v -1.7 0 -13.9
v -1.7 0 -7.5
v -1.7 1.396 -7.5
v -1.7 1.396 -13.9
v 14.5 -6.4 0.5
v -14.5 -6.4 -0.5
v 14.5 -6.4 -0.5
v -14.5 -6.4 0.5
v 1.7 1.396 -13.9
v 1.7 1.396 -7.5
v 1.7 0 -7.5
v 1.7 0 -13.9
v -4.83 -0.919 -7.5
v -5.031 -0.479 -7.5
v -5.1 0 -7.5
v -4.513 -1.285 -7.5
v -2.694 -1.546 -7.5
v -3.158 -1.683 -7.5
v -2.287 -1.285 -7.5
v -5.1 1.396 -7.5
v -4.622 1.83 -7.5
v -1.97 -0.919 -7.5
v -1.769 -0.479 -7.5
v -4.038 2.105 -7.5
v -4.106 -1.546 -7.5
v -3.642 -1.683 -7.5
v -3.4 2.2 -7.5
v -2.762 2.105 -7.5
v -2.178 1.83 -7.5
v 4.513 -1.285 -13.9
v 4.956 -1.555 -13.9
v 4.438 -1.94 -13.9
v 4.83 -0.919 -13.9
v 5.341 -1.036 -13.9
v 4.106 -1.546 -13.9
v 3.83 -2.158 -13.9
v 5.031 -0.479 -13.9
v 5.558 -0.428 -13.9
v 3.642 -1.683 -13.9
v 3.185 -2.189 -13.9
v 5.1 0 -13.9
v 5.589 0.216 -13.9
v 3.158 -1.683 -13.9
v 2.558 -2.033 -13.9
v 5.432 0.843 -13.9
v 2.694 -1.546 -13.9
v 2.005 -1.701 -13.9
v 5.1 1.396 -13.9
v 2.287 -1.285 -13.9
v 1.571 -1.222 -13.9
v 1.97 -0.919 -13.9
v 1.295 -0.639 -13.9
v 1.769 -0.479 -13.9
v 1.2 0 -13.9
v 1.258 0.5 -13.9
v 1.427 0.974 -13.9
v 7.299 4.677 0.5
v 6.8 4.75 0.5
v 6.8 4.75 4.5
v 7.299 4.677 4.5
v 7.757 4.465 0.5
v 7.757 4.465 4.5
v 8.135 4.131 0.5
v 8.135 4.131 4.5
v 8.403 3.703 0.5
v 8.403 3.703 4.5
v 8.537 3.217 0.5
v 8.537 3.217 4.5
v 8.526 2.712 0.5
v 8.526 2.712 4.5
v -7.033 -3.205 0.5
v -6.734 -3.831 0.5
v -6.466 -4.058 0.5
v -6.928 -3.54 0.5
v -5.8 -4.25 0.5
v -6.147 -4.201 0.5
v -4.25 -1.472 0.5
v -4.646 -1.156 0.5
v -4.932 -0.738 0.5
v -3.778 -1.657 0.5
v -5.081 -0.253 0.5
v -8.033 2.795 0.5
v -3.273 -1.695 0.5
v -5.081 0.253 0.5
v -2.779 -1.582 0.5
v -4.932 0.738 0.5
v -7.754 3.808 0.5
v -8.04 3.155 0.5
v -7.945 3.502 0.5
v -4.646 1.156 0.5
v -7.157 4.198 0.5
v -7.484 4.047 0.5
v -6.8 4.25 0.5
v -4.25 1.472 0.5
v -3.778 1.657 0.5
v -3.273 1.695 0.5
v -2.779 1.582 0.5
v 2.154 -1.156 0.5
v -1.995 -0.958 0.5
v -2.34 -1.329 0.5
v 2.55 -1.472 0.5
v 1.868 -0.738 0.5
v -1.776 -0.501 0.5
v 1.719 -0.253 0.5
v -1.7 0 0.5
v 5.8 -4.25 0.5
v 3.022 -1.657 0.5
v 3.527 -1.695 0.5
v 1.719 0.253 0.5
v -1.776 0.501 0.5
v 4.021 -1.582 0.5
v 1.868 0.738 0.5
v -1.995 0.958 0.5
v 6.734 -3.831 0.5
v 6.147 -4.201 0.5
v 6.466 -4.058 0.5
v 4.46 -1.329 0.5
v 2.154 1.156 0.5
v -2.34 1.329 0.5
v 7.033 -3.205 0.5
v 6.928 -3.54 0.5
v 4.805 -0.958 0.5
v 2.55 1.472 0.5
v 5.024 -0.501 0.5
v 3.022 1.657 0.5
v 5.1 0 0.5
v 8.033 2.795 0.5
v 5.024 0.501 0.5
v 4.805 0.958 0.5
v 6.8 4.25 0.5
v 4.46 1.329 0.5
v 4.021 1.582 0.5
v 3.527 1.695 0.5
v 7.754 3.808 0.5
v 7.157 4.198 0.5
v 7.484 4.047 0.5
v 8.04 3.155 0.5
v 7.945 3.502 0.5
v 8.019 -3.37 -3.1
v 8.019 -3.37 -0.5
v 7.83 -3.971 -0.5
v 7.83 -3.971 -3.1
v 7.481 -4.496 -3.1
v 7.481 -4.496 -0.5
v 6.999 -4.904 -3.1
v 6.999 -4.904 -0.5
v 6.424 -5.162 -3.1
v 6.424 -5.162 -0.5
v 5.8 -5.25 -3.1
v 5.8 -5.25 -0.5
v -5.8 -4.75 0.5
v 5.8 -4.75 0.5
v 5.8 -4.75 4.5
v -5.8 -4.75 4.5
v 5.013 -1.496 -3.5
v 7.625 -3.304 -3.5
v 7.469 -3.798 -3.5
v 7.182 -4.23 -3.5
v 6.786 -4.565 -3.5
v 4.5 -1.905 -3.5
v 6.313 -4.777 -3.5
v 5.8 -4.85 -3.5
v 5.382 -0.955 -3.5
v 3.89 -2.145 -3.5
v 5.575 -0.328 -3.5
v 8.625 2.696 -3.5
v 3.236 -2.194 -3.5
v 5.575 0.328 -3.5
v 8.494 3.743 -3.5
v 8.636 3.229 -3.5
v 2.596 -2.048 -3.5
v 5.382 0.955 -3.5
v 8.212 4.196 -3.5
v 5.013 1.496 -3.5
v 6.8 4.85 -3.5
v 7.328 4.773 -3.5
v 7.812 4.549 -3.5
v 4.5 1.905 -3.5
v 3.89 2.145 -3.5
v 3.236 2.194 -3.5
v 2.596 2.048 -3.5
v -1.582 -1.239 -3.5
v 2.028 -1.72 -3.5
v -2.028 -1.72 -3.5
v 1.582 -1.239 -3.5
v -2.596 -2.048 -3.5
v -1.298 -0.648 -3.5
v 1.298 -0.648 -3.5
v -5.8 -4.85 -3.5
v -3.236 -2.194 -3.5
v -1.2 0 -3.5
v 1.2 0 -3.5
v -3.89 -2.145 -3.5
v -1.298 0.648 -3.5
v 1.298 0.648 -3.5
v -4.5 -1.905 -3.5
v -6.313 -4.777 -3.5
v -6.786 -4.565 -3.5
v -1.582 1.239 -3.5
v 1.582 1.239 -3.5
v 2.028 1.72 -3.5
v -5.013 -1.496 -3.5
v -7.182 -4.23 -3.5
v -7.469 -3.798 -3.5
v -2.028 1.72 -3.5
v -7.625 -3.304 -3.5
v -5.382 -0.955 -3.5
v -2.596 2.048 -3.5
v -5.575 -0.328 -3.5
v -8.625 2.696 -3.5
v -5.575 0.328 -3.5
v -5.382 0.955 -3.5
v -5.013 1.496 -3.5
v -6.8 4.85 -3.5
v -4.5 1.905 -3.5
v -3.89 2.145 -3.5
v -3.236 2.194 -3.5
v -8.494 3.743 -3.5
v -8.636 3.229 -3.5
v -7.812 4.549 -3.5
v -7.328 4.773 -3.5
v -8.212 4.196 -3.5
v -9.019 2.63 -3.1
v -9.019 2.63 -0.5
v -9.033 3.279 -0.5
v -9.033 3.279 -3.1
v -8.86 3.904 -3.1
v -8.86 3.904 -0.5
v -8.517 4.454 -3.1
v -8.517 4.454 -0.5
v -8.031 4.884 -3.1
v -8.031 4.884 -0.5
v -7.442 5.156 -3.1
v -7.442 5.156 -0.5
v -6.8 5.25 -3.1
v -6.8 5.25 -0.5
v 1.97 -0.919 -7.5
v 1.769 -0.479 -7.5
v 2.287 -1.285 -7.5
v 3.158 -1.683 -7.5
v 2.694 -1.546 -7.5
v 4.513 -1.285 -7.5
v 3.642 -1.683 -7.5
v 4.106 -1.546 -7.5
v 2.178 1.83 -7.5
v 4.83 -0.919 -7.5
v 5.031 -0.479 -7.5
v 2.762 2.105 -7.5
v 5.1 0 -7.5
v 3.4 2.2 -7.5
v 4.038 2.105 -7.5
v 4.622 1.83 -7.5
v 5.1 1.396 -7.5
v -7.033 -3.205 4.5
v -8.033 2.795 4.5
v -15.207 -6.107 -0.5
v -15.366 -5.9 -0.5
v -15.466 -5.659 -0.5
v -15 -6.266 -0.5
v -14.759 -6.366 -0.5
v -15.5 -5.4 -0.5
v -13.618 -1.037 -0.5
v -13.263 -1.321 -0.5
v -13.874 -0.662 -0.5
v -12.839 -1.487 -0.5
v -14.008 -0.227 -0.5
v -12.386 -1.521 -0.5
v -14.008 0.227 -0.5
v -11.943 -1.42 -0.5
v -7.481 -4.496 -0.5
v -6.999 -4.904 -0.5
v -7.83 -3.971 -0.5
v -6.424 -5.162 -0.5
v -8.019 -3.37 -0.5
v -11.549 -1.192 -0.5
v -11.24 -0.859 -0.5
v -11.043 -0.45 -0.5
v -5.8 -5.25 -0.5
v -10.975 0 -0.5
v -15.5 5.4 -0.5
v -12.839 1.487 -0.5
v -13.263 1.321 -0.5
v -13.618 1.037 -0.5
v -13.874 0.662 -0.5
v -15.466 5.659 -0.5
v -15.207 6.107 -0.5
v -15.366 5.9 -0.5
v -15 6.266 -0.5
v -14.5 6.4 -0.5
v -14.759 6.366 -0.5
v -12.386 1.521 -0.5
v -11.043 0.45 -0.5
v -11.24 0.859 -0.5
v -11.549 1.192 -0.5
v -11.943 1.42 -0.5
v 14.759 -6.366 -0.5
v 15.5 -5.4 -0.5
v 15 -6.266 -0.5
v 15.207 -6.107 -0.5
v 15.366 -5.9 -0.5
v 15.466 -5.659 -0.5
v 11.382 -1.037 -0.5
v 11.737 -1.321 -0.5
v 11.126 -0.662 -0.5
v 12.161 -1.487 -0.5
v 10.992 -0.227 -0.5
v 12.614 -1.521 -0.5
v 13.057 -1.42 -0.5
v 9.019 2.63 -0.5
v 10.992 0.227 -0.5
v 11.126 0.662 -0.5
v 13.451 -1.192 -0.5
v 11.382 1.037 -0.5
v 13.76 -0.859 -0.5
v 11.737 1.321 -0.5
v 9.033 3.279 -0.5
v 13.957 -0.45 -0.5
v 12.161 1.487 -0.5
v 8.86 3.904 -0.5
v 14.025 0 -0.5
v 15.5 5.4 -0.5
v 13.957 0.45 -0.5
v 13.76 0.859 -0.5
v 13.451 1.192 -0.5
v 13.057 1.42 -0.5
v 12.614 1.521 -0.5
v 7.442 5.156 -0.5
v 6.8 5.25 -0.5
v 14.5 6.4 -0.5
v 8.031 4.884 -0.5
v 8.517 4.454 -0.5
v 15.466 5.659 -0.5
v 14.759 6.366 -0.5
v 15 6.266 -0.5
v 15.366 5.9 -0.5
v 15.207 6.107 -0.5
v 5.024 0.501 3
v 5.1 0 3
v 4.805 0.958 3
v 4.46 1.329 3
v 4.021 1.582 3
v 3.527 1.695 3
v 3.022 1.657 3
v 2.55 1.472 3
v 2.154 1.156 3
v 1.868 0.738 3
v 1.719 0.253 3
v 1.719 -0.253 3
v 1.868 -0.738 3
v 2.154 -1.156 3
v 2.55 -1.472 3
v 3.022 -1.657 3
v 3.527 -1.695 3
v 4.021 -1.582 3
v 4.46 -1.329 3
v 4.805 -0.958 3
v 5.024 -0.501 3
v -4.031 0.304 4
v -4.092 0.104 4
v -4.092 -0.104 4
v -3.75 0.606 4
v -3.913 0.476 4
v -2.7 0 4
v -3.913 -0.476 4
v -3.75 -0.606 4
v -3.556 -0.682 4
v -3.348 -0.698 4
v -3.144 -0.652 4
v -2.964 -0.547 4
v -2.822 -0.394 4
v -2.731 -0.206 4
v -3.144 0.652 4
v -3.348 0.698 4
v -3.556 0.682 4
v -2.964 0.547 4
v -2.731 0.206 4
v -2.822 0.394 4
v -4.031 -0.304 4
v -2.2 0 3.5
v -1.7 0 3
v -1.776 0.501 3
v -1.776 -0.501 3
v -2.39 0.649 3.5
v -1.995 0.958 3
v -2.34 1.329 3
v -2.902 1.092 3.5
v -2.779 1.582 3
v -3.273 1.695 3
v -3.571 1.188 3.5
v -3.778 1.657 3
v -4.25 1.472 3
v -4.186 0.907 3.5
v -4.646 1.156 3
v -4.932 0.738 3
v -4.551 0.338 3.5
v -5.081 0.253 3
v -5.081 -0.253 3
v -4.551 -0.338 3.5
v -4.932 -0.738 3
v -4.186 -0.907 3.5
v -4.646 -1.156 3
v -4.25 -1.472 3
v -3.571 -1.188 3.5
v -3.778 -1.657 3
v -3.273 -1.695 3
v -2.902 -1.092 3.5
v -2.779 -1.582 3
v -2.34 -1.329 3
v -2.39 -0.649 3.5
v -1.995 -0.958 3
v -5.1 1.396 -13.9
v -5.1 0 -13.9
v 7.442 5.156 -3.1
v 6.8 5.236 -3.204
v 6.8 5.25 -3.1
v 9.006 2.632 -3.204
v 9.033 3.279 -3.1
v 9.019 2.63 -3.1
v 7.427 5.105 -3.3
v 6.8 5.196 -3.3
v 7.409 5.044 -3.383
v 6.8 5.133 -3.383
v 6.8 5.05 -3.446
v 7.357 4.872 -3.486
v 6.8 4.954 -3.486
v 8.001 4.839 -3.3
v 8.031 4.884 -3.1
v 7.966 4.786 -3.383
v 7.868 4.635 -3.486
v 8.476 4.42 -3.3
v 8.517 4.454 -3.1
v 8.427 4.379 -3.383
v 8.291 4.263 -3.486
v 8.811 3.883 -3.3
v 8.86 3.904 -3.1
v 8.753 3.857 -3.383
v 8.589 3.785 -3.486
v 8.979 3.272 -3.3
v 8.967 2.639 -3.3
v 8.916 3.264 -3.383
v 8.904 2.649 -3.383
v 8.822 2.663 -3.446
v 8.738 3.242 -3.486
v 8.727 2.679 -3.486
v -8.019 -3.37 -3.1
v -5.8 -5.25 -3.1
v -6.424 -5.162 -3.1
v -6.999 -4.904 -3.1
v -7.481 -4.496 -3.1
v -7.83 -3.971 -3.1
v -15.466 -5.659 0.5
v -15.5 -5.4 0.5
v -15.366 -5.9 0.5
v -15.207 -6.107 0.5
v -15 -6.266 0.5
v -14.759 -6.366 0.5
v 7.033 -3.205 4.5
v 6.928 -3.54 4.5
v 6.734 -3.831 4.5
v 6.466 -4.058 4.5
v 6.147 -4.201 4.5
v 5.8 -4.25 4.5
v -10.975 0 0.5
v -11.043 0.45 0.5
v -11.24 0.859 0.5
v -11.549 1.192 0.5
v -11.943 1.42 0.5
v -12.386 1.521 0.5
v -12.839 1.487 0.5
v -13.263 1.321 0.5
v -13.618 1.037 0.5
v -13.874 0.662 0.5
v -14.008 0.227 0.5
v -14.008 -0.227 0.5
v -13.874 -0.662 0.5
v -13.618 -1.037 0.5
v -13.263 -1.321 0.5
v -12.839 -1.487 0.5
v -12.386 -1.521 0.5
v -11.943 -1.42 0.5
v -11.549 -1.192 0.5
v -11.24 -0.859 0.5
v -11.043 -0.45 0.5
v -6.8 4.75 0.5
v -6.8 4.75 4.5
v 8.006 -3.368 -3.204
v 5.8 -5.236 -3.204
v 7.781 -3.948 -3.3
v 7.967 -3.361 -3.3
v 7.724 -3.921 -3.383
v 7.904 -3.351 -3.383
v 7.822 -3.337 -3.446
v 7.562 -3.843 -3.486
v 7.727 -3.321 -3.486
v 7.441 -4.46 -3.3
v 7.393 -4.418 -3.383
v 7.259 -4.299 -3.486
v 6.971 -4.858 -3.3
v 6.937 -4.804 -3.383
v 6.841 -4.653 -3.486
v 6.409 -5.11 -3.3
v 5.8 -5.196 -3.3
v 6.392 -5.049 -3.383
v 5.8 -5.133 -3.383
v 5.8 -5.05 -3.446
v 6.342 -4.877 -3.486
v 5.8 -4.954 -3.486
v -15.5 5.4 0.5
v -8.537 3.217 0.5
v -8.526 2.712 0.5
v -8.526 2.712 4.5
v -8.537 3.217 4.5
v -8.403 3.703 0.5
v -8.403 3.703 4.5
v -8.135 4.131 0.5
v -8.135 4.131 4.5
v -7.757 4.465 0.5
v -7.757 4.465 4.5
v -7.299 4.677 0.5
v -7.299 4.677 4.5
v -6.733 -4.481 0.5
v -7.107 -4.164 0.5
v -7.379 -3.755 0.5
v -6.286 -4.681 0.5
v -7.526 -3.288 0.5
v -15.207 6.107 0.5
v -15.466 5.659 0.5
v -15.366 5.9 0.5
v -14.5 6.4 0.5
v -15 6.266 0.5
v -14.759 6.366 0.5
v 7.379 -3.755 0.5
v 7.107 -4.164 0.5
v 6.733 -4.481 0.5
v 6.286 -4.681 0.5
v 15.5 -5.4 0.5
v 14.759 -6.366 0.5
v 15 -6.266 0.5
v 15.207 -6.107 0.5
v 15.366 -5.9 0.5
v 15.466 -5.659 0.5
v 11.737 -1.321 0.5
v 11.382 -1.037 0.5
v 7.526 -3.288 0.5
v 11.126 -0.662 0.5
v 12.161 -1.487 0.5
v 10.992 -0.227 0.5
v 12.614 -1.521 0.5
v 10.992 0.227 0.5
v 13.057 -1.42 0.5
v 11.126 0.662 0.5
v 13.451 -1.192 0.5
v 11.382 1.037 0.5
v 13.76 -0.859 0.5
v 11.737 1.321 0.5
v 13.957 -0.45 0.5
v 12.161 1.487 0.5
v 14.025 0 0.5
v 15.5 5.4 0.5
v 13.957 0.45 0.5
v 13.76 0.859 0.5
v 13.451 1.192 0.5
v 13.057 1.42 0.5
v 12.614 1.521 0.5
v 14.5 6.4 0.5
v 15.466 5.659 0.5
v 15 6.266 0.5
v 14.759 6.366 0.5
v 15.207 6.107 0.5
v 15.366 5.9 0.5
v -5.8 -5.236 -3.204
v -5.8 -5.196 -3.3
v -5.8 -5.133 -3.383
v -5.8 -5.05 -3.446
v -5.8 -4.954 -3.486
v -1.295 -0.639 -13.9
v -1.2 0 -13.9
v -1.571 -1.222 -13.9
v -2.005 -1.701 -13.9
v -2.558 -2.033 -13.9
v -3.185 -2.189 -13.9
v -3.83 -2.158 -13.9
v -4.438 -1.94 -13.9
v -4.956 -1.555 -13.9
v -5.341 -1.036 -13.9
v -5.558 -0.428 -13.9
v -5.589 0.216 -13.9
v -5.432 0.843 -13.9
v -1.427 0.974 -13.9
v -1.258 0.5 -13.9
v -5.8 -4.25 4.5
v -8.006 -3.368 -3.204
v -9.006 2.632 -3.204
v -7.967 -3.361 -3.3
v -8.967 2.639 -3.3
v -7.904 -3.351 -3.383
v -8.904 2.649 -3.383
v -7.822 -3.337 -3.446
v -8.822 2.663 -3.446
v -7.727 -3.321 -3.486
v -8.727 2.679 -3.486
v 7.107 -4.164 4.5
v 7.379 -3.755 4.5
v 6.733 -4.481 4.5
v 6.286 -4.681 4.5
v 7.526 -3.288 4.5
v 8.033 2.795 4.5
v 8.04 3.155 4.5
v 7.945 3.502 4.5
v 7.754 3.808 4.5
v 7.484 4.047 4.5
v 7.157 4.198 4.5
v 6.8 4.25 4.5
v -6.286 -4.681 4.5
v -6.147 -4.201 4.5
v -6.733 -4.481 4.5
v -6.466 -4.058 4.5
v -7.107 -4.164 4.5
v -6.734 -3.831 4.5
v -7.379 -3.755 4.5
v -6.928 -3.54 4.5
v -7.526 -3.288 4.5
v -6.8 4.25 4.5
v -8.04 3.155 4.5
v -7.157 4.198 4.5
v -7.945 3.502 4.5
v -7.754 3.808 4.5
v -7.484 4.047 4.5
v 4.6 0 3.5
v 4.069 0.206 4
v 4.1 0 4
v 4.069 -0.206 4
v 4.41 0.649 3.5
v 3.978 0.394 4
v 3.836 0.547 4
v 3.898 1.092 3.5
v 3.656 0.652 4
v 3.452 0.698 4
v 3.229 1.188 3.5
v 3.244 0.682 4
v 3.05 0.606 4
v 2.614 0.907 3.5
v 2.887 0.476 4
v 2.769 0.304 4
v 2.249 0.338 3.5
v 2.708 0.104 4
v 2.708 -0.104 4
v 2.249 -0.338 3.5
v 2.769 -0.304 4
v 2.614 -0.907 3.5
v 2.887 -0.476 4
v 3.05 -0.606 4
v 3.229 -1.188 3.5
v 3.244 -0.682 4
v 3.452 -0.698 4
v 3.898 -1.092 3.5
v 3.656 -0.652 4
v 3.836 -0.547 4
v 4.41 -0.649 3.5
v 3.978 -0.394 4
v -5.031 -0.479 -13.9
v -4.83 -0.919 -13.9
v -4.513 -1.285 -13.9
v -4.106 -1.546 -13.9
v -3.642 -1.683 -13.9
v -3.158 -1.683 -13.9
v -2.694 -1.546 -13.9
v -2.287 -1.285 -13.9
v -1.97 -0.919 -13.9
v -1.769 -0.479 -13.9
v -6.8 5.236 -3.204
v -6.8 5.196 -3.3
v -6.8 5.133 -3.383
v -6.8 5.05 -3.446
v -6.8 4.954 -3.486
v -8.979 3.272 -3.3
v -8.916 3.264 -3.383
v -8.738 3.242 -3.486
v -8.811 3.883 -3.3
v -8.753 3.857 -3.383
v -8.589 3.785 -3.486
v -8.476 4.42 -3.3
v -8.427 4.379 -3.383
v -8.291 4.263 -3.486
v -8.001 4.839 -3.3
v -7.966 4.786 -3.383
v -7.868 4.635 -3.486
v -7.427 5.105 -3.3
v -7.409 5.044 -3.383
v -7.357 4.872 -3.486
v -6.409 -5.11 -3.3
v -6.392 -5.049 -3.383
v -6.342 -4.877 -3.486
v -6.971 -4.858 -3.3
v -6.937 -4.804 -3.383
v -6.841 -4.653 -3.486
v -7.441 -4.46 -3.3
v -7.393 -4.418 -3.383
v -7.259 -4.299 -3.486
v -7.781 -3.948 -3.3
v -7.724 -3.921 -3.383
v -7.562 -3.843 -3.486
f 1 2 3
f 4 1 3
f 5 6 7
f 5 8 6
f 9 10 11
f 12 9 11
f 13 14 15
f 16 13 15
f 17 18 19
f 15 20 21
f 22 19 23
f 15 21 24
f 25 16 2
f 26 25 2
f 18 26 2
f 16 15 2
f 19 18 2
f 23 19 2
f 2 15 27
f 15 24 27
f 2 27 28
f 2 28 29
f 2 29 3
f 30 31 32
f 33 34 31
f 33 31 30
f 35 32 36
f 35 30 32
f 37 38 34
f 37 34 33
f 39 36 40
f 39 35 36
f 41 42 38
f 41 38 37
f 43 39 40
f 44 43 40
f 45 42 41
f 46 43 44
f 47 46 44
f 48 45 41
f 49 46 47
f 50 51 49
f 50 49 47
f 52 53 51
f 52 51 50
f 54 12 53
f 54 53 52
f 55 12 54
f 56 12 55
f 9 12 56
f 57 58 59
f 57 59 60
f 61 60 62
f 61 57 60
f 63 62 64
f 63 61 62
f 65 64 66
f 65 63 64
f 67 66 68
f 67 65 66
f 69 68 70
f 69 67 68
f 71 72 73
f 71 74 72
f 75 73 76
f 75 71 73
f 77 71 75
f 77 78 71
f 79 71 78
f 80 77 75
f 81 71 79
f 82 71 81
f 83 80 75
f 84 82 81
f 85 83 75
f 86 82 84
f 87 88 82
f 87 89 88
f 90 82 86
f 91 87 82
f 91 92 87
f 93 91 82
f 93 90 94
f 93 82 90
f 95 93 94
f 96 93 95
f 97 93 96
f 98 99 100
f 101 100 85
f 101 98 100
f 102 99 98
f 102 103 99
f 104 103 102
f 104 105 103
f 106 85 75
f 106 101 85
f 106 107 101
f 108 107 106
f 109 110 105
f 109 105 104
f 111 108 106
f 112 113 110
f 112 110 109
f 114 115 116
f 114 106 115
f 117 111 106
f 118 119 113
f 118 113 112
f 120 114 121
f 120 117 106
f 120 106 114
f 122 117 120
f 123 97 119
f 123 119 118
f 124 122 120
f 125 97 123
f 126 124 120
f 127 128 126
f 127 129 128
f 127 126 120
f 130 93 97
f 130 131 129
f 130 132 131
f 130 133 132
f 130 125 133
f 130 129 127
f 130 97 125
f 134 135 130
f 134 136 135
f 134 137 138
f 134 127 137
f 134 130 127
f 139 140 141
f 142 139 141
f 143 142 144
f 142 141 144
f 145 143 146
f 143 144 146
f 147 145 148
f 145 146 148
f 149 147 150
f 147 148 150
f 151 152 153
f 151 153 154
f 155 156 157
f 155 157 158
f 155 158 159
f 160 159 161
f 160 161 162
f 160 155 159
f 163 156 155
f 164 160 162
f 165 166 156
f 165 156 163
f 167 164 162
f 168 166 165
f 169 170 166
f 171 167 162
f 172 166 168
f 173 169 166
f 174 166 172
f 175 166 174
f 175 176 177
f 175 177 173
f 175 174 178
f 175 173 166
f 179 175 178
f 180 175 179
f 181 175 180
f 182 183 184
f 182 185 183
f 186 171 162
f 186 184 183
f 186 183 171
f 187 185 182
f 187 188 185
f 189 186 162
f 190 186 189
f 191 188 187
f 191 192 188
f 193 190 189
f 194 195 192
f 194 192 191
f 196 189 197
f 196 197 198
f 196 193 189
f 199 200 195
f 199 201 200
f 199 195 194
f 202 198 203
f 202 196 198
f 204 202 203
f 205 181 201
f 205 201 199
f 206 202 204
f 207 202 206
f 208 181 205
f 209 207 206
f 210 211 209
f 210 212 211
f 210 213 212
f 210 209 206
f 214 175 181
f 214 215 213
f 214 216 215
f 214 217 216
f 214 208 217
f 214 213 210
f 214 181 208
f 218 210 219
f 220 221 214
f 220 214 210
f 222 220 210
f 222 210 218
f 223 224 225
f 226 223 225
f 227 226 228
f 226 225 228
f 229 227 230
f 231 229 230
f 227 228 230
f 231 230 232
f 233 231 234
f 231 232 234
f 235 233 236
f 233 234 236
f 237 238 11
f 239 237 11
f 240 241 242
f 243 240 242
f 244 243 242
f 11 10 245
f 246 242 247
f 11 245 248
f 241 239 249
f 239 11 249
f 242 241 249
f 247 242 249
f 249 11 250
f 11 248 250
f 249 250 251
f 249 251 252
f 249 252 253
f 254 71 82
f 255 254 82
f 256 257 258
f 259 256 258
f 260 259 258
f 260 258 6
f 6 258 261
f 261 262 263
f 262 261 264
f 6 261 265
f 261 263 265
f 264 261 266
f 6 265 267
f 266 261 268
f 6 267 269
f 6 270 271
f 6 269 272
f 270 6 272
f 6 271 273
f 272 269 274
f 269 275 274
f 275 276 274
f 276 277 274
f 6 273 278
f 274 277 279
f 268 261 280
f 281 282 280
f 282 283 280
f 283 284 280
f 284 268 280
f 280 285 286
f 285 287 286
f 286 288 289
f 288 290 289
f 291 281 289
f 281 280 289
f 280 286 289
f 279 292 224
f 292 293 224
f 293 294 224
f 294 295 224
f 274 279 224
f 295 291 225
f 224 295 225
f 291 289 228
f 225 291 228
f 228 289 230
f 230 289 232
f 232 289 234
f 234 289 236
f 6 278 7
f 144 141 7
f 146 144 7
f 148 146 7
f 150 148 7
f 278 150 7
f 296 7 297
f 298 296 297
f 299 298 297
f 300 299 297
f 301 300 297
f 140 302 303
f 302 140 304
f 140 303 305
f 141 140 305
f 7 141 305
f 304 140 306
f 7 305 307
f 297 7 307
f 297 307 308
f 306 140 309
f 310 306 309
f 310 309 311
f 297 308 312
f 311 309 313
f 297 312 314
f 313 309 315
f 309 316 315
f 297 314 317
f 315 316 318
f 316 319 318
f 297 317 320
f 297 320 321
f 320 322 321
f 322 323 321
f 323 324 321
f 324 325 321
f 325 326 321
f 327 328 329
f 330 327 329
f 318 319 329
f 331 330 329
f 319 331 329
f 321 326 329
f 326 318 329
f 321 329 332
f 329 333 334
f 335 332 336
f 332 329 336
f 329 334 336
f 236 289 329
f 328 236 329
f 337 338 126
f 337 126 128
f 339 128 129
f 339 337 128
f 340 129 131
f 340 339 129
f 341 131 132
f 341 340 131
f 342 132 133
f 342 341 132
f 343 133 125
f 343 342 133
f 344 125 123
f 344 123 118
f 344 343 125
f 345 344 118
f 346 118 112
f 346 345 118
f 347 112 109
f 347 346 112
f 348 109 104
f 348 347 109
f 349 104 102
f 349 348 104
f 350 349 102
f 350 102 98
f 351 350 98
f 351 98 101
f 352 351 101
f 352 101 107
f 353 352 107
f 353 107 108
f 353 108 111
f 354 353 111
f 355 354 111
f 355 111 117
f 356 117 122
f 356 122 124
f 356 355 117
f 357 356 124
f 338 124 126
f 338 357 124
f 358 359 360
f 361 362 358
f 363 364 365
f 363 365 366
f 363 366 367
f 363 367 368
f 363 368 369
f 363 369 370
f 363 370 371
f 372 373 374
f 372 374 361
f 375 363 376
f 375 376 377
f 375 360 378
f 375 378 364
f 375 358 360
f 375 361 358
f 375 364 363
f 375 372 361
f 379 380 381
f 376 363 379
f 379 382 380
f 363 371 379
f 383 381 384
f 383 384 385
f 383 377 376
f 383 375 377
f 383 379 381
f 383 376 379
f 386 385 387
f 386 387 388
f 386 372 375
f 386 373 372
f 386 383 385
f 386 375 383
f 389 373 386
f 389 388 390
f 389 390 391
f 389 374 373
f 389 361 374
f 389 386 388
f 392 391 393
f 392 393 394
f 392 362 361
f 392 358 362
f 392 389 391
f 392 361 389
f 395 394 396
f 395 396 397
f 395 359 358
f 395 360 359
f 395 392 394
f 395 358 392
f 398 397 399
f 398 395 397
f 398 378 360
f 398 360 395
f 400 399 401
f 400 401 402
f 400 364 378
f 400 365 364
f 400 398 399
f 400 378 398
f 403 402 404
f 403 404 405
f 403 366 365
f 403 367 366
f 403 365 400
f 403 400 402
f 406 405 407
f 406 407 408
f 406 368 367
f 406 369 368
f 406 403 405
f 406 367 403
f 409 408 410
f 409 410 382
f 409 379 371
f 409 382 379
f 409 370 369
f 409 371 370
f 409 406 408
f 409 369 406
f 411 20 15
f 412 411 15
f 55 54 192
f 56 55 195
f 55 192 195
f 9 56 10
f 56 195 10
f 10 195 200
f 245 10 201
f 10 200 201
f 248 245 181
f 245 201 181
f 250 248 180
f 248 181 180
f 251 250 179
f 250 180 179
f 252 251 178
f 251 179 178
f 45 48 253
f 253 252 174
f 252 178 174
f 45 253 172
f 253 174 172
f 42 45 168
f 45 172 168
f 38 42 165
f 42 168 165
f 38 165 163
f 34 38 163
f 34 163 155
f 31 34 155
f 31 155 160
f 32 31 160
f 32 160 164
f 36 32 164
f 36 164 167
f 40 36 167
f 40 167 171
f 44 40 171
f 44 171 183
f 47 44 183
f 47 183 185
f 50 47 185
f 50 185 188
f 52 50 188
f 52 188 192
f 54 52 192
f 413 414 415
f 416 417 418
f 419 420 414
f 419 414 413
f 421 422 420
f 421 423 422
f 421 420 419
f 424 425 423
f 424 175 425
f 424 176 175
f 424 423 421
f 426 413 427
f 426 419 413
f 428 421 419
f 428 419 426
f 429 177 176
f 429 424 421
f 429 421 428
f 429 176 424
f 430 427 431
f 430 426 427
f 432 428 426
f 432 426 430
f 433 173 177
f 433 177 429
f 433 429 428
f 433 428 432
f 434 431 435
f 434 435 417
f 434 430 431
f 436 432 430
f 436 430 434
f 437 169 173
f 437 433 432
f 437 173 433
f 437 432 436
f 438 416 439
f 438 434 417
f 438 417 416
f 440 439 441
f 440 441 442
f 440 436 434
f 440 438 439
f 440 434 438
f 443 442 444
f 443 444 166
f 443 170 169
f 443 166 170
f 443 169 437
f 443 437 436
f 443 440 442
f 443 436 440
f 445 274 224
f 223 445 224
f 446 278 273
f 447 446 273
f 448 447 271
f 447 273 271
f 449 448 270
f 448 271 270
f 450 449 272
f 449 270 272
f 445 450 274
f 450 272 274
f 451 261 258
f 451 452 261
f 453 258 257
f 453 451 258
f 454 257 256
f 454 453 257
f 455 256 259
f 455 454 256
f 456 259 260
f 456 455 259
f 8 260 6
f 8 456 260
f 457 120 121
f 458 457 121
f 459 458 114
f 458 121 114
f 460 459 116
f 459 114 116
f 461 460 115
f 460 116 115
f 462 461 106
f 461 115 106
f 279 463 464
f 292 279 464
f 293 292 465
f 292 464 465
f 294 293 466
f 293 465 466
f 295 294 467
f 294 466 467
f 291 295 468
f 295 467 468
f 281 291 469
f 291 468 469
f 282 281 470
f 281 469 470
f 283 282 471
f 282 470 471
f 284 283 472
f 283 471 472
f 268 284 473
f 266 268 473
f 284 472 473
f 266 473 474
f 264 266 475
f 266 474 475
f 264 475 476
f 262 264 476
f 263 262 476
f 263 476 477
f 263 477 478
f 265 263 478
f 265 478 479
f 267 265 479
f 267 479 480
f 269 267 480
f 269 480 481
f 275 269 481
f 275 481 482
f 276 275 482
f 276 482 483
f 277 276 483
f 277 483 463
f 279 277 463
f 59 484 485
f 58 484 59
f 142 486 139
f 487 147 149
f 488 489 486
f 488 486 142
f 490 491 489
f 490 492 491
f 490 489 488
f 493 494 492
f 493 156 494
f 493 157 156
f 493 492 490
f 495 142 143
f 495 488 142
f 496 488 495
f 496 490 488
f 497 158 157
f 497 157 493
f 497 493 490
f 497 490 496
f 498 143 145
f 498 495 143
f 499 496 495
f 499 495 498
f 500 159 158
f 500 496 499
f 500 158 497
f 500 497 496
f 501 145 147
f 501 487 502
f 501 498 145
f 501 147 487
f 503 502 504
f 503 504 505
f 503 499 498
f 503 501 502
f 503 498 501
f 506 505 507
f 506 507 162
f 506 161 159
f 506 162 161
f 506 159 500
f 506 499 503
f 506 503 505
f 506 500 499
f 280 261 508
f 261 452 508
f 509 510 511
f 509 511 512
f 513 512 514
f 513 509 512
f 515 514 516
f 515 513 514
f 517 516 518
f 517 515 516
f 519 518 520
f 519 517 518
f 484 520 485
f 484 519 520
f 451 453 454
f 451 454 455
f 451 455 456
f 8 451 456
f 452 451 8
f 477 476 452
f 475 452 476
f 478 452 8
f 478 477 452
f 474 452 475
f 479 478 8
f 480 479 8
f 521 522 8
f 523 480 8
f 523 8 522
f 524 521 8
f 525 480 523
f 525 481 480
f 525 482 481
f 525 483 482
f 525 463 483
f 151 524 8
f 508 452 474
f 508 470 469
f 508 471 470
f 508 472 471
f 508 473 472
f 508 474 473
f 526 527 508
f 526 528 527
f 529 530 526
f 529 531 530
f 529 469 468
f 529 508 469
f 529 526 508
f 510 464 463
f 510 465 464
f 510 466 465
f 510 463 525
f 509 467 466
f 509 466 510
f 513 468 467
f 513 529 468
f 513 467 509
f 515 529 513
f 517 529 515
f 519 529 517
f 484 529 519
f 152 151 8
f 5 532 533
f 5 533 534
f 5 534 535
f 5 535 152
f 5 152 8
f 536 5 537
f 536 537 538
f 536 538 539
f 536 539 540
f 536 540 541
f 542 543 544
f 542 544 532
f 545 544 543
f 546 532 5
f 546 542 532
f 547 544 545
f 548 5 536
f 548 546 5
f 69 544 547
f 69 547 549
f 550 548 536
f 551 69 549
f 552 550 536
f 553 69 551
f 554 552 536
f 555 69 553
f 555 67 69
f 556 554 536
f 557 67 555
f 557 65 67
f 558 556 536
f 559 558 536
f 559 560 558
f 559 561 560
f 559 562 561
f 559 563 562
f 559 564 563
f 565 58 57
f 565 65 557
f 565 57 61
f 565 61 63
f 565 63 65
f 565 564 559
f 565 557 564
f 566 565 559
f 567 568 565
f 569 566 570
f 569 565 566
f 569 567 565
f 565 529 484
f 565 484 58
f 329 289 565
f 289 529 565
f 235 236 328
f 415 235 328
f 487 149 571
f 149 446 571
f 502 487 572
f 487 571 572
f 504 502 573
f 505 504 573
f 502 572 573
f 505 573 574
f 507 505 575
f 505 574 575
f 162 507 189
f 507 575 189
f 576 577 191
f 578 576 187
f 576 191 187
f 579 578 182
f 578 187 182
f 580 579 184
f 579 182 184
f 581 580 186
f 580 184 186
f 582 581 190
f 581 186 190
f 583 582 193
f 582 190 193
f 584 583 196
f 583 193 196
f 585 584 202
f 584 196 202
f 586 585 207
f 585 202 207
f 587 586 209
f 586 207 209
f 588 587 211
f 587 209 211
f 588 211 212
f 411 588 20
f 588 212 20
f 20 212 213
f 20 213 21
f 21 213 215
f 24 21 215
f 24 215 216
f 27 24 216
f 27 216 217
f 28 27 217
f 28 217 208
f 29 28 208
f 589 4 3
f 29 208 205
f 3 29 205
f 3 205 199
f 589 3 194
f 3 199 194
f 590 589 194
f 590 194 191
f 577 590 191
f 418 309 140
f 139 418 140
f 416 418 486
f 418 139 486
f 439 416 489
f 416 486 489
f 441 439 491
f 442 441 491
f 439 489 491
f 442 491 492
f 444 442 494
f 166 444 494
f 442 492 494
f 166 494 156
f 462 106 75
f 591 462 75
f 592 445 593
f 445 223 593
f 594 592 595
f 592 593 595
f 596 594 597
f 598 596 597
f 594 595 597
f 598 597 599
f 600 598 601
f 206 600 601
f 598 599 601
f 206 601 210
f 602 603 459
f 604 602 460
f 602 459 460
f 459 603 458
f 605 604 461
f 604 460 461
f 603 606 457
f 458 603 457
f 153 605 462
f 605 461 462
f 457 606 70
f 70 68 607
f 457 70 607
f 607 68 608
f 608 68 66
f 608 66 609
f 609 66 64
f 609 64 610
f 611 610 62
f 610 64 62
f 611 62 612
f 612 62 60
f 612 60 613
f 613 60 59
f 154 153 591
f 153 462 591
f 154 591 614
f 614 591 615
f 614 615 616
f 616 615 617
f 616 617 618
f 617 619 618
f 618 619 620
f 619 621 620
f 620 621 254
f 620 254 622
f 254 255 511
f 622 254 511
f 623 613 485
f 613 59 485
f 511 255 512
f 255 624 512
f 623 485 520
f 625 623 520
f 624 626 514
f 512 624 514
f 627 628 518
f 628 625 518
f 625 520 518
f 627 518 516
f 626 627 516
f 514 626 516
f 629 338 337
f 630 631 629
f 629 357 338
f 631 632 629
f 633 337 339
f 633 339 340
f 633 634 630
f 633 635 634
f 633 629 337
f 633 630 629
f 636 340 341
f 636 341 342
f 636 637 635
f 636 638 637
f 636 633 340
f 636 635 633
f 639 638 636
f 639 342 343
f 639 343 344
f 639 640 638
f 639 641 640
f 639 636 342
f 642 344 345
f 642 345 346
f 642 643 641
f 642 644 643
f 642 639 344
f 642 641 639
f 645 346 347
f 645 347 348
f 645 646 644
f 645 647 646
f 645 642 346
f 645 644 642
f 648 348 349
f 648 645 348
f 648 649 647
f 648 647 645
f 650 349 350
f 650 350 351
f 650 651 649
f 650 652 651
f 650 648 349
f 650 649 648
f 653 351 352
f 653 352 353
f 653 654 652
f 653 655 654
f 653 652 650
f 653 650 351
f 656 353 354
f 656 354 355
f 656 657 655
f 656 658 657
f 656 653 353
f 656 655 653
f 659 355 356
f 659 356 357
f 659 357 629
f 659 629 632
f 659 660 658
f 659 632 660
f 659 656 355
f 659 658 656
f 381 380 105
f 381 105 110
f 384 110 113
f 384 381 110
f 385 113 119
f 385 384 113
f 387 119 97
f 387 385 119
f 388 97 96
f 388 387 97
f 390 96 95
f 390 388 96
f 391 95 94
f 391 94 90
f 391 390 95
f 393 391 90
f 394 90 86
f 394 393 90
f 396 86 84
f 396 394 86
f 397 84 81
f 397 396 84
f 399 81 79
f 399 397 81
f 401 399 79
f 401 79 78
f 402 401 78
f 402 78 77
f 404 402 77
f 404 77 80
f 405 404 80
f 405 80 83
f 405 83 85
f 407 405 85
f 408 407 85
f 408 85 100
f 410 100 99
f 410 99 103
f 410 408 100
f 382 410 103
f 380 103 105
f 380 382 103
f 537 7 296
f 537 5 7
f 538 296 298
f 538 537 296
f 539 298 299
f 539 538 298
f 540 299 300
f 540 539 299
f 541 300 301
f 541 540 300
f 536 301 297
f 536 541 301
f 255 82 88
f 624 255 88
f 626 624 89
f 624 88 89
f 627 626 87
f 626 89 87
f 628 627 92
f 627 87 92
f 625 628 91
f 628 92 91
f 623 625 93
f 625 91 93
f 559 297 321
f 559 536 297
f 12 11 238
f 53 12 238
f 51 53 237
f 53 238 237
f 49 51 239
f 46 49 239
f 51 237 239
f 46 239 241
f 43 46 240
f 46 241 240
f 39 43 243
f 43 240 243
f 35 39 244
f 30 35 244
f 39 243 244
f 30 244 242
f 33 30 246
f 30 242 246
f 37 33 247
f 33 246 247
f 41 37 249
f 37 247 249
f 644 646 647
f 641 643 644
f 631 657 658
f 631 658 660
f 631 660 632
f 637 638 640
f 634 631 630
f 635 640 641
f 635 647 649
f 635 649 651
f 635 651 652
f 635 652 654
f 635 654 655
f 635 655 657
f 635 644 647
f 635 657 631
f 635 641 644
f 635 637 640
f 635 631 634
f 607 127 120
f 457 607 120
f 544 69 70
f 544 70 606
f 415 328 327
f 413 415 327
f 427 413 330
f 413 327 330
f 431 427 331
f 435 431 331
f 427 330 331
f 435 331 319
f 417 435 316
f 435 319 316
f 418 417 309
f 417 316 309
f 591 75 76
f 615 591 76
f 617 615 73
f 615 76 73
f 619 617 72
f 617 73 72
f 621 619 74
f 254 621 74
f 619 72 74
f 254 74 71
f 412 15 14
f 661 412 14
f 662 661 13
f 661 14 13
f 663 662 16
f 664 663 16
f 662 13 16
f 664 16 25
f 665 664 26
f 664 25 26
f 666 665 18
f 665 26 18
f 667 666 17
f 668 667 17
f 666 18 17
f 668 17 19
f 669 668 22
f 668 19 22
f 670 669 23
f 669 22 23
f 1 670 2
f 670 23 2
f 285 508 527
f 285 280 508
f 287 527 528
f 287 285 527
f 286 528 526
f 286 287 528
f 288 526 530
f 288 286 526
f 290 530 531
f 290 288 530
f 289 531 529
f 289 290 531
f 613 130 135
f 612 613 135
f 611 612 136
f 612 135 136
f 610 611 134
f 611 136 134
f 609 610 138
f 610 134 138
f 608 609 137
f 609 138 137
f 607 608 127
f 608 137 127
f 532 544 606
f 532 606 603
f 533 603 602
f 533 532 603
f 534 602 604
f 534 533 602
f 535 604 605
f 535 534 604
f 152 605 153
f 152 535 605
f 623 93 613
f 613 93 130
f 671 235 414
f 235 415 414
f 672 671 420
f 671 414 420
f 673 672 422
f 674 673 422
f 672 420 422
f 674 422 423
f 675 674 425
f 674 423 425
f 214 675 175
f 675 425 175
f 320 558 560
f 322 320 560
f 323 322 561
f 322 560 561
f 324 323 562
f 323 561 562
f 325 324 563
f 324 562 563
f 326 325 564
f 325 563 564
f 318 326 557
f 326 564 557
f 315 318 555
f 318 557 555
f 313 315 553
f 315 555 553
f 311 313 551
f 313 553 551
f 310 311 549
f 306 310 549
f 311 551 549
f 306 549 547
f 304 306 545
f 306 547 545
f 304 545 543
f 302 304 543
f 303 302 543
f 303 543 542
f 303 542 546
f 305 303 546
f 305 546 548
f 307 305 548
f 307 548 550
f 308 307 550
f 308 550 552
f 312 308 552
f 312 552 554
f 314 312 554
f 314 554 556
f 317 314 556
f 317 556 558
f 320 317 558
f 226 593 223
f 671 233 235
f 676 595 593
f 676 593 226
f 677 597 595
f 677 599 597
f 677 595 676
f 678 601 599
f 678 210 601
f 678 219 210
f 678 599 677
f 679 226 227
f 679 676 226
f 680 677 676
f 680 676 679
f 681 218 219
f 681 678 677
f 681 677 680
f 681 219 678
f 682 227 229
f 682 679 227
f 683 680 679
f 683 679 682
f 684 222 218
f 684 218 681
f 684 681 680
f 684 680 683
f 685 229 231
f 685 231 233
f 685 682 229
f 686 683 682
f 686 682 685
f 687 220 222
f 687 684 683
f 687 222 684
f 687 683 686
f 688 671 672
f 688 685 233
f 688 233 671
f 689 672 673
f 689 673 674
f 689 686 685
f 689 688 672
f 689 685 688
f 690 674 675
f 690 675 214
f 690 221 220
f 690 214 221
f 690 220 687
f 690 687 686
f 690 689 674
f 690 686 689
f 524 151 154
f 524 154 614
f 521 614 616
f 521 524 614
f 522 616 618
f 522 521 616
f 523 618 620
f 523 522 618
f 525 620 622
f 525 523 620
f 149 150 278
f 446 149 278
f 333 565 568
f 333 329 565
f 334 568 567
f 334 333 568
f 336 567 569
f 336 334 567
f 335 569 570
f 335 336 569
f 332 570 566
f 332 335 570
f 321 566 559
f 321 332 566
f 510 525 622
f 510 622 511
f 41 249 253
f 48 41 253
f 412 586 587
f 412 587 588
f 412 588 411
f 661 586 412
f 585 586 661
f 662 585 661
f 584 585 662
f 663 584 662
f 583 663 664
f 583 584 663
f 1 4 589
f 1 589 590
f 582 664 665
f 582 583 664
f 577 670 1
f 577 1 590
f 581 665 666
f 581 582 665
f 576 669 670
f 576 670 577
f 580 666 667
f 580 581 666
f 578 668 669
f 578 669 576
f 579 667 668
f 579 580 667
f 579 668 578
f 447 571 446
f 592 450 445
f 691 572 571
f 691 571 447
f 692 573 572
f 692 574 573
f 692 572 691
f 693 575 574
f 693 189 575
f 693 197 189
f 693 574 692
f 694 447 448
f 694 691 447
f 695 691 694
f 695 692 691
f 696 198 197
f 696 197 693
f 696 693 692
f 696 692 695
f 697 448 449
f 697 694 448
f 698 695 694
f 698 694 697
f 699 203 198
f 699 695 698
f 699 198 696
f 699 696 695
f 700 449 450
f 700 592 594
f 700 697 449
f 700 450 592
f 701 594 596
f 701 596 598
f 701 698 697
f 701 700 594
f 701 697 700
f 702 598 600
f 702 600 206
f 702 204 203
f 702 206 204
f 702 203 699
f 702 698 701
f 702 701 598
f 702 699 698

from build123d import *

# Parameters (mm, degrees)
SKETCH1_W           = 31
SKETCH1_H           = 12.8
BOSS_EXTRUDE1_DEPTH = 0.5
SKETCH2_R           = 1.525
CUT_EXTRUDE1_DEPTH  = 17.799107119
BOSS_EXTRUDE5_DEPTH = 4
BOSS_EXTRUDE3_DEPTH = 3
SKETCH6_R           = 2.2
BOSS_EXTRUDE4_DEPTH = 10.4
CUT_EXTRUDE2_START  = -6.4
CUT_EXTRUDE2_DEPTH  = 6.4
BOSS_EXTRUDE6_START = 3.5
SKETCH12_R          = 1.7
BOSS_EXTRUDE6_DEPTH = 3.5
CHAMFER1_SIZE       = 1
FILLET1_R           = 1
FILLET2_R           = 0.4


with BuildPart() as part:
    # Sketch1 → Boss-Extrude1 (new, symmetric)
    with BuildSketch(Plane.XY):
        Rectangle(SKETCH1_W, SKETCH1_H)
    extrude(amount=BOSS_EXTRUDE1_DEPTH, both=True)

    # Sketch2 → Cut-Extrude1 (cut, through all)
    with BuildSketch(Plane.XY.offset(0.5)):
        with Locations((12.5, 0)):
            Circle(SKETCH2_R)
        with Locations((-12.5, 0)):
            Circle(SKETCH2_R)
    extrude(amount=-CUT_EXTRUDE1_DEPTH, mode=Mode.SUBTRACT)

    # Sketch10 → Boss-Extrude5 (add)
    with BuildSketch(Plane.XY.offset(0.5)):
        with BuildLine():
            Line((-7.526189367, -3.287698228), (-8.526189367, 2.712301772))
            ThreePointArc((-8.526189367, 2.712301772), (-8.135284969, 4.131156068), (-6.8, 4.75))
            Line((-6.8, 4.75), (6.8, 4.75))
            ThreePointArc((6.8, 4.75), (8.135284969, 4.131156068), (8.526189367, 2.712301772))
            Line((8.526189367, 2.712301772), (7.526189367, -3.287698228))
            ThreePointArc((7.526189367, -3.287698228), (6.931156068, -4.335284969), (5.8, -4.75))
            Line((5.8, -4.75), (-5.8, -4.75))
            ThreePointArc((-5.8, -4.75), (-6.931156068, -4.335284969), (-7.526189367, -3.287698228))
        make_face()
        with BuildLine():
            Line((-7.032992405, -3.205498734), (-8.032992405, 2.794501266))
            ThreePointArc((-8.032992405, 2.794501266), (-7.753774978, 3.80796862), (-6.8, 4.25))
            Line((-6.8, 4.25), (6.8, 4.25))
            ThreePointArc((6.8, 4.25), (7.753774978, 3.80796862), (8.032992405, 2.794501266))
            Line((8.032992405, 2.794501266), (7.032992405, -3.205498734))
            ThreePointArc((7.032992405, -3.205498734), (6.60796862, -3.953774978), (5.8, -4.25))
            Line((5.8, -4.25), (-5.8, -4.25))
            ThreePointArc((-5.8, -4.25), (-6.60796862, -3.953774978), (-7.032992405, -3.205498734))
        make_face(mode=Mode.SUBTRACT)
    extrude(amount=BOSS_EXTRUDE5_DEPTH)

    # Sketch5 → Boss-Extrude3 (add)
    with BuildSketch(Plane(origin=(0, 0, -0.5), x_dir=(-1, 0, 0), z_dir=(0, 0, -1))):
        with BuildLine():
            Line((8.019386329, -3.369897721), (9.019386329, 2.630102279))
            ThreePointArc((9.019386329, 2.630102279), (8.516794961, 4.454343516), (6.8, 5.25))
            Line((6.8, 5.25), (-6.8, 5.25))
            ThreePointArc((-6.8, 5.25), (-8.516794961, 4.454343516), (-9.019386329, 2.630102279))
            Line((-9.019386329, 2.630102279), (-8.019386329, -3.369897721))
            ThreePointArc((-8.019386329, -3.369897721), (-7.254343516, -4.716794961), (-5.8, -5.25))
            Line((-5.8, -5.25), (5.8, -5.25))
            ThreePointArc((5.8, -5.25), (7.254343516, -4.716794961), (8.019386329, -3.369897721))
        make_face()
    extrude(amount=BOSS_EXTRUDE3_DEPTH)

    # Sketch6 → Boss-Extrude4 (add)
    with BuildSketch(Plane(origin=(0, 0, -3.5), x_dir=(-1, 0, 0), z_dir=(0, 0, -1))):
        with Locations((-3.4, 0)):
            Circle(SKETCH6_R)
        with Locations(Location((3.4, 0, 0), (0, 0, 180))):
            Circle(SKETCH6_R)
    extrude(amount=BOSS_EXTRUDE4_DEPTH)

    # Sketch7 → Cut-Extrude2 (cut)
    with BuildSketch(Plane(origin=(0, 0, -13.9), x_dir=(-1, 0, 0), z_dir=(0, 0, -1)).offset(CUT_EXTRUDE2_START)):
        with BuildLine():
            Line((-5.1, 0), (-5.1, 1.396424004))
            ThreePointArc((-5.1, 1.396424004), (-3.4, 2.2), (-1.7, 1.396424004))
            Line((-1.7, 1.396424004), (-1.7, 0))
            ThreePointArc((-1.7, 0), (-3.4, -1.7), (-5.1, 0))
        make_face()
        with BuildLine():
            Line((1.7, 0), (1.7, 1.396424004))
            ThreePointArc((1.7, 1.396424004), (3.4, 2.2), (5.1, 1.396424004))
            Line((5.1, 1.396424004), (5.1, 0))
            ThreePointArc((5.1, 0), (3.4, -1.7), (1.7, 0))
        make_face()
    extrude(amount=CUT_EXTRUDE2_DEPTH, mode=Mode.SUBTRACT)

    # Sketch12 → Boss-Extrude6 (add)
    with BuildSketch(Plane.XY.offset(0.5).offset(BOSS_EXTRUDE6_START)):
        with Locations((-3.4, 0)):
            Circle(SKETCH12_R)
        with Locations((3.4, 0)):
            Circle(SKETCH12_R)
    extrude(amount=-BOSS_EXTRUDE6_DEPTH)

    # Chamfer1
    chamfer1_edges = [part.edges().sort_by_distance(p)[0] for p in [
        (-5.1, 0, 4),
        (1.7, 0, 4),
    ]]
    chamfer(chamfer1_edges, length=CHAMFER1_SIZE)

    # Fillet1
    fillet1_edges = [part.edges().sort_by_distance(p)[0] for p in [
        (-15.5, 6.4, 0),
        (15.5, 6.4, 0),
        (15.5, -6.4, 0),
        (-15.5, -6.4, 0),
    ]]
    fillet(fillet1_edges, radius=FILLET1_R)

    # Fillet2
    fillet2_edges = [part.edges().sort_by_distance(p)[0] for p in [
        (-8.516794961, 4.454343516, -3.5),
        (0, 5.25, -3.5),
        (8.516794961, 4.454343516, -3.5),
        (8.519386329, -0.369897721, -3.5),
        (7.254343516, -4.716794961, -3.5),
        (0, -5.25, -3.5),
        (-7.254343516, -4.716794961, -3.5),
        (-8.519386329, -0.369897721, -3.5),
    ]]
    fillet(fillet2_edges, radius=FILLET2_R)


solid = part.part
